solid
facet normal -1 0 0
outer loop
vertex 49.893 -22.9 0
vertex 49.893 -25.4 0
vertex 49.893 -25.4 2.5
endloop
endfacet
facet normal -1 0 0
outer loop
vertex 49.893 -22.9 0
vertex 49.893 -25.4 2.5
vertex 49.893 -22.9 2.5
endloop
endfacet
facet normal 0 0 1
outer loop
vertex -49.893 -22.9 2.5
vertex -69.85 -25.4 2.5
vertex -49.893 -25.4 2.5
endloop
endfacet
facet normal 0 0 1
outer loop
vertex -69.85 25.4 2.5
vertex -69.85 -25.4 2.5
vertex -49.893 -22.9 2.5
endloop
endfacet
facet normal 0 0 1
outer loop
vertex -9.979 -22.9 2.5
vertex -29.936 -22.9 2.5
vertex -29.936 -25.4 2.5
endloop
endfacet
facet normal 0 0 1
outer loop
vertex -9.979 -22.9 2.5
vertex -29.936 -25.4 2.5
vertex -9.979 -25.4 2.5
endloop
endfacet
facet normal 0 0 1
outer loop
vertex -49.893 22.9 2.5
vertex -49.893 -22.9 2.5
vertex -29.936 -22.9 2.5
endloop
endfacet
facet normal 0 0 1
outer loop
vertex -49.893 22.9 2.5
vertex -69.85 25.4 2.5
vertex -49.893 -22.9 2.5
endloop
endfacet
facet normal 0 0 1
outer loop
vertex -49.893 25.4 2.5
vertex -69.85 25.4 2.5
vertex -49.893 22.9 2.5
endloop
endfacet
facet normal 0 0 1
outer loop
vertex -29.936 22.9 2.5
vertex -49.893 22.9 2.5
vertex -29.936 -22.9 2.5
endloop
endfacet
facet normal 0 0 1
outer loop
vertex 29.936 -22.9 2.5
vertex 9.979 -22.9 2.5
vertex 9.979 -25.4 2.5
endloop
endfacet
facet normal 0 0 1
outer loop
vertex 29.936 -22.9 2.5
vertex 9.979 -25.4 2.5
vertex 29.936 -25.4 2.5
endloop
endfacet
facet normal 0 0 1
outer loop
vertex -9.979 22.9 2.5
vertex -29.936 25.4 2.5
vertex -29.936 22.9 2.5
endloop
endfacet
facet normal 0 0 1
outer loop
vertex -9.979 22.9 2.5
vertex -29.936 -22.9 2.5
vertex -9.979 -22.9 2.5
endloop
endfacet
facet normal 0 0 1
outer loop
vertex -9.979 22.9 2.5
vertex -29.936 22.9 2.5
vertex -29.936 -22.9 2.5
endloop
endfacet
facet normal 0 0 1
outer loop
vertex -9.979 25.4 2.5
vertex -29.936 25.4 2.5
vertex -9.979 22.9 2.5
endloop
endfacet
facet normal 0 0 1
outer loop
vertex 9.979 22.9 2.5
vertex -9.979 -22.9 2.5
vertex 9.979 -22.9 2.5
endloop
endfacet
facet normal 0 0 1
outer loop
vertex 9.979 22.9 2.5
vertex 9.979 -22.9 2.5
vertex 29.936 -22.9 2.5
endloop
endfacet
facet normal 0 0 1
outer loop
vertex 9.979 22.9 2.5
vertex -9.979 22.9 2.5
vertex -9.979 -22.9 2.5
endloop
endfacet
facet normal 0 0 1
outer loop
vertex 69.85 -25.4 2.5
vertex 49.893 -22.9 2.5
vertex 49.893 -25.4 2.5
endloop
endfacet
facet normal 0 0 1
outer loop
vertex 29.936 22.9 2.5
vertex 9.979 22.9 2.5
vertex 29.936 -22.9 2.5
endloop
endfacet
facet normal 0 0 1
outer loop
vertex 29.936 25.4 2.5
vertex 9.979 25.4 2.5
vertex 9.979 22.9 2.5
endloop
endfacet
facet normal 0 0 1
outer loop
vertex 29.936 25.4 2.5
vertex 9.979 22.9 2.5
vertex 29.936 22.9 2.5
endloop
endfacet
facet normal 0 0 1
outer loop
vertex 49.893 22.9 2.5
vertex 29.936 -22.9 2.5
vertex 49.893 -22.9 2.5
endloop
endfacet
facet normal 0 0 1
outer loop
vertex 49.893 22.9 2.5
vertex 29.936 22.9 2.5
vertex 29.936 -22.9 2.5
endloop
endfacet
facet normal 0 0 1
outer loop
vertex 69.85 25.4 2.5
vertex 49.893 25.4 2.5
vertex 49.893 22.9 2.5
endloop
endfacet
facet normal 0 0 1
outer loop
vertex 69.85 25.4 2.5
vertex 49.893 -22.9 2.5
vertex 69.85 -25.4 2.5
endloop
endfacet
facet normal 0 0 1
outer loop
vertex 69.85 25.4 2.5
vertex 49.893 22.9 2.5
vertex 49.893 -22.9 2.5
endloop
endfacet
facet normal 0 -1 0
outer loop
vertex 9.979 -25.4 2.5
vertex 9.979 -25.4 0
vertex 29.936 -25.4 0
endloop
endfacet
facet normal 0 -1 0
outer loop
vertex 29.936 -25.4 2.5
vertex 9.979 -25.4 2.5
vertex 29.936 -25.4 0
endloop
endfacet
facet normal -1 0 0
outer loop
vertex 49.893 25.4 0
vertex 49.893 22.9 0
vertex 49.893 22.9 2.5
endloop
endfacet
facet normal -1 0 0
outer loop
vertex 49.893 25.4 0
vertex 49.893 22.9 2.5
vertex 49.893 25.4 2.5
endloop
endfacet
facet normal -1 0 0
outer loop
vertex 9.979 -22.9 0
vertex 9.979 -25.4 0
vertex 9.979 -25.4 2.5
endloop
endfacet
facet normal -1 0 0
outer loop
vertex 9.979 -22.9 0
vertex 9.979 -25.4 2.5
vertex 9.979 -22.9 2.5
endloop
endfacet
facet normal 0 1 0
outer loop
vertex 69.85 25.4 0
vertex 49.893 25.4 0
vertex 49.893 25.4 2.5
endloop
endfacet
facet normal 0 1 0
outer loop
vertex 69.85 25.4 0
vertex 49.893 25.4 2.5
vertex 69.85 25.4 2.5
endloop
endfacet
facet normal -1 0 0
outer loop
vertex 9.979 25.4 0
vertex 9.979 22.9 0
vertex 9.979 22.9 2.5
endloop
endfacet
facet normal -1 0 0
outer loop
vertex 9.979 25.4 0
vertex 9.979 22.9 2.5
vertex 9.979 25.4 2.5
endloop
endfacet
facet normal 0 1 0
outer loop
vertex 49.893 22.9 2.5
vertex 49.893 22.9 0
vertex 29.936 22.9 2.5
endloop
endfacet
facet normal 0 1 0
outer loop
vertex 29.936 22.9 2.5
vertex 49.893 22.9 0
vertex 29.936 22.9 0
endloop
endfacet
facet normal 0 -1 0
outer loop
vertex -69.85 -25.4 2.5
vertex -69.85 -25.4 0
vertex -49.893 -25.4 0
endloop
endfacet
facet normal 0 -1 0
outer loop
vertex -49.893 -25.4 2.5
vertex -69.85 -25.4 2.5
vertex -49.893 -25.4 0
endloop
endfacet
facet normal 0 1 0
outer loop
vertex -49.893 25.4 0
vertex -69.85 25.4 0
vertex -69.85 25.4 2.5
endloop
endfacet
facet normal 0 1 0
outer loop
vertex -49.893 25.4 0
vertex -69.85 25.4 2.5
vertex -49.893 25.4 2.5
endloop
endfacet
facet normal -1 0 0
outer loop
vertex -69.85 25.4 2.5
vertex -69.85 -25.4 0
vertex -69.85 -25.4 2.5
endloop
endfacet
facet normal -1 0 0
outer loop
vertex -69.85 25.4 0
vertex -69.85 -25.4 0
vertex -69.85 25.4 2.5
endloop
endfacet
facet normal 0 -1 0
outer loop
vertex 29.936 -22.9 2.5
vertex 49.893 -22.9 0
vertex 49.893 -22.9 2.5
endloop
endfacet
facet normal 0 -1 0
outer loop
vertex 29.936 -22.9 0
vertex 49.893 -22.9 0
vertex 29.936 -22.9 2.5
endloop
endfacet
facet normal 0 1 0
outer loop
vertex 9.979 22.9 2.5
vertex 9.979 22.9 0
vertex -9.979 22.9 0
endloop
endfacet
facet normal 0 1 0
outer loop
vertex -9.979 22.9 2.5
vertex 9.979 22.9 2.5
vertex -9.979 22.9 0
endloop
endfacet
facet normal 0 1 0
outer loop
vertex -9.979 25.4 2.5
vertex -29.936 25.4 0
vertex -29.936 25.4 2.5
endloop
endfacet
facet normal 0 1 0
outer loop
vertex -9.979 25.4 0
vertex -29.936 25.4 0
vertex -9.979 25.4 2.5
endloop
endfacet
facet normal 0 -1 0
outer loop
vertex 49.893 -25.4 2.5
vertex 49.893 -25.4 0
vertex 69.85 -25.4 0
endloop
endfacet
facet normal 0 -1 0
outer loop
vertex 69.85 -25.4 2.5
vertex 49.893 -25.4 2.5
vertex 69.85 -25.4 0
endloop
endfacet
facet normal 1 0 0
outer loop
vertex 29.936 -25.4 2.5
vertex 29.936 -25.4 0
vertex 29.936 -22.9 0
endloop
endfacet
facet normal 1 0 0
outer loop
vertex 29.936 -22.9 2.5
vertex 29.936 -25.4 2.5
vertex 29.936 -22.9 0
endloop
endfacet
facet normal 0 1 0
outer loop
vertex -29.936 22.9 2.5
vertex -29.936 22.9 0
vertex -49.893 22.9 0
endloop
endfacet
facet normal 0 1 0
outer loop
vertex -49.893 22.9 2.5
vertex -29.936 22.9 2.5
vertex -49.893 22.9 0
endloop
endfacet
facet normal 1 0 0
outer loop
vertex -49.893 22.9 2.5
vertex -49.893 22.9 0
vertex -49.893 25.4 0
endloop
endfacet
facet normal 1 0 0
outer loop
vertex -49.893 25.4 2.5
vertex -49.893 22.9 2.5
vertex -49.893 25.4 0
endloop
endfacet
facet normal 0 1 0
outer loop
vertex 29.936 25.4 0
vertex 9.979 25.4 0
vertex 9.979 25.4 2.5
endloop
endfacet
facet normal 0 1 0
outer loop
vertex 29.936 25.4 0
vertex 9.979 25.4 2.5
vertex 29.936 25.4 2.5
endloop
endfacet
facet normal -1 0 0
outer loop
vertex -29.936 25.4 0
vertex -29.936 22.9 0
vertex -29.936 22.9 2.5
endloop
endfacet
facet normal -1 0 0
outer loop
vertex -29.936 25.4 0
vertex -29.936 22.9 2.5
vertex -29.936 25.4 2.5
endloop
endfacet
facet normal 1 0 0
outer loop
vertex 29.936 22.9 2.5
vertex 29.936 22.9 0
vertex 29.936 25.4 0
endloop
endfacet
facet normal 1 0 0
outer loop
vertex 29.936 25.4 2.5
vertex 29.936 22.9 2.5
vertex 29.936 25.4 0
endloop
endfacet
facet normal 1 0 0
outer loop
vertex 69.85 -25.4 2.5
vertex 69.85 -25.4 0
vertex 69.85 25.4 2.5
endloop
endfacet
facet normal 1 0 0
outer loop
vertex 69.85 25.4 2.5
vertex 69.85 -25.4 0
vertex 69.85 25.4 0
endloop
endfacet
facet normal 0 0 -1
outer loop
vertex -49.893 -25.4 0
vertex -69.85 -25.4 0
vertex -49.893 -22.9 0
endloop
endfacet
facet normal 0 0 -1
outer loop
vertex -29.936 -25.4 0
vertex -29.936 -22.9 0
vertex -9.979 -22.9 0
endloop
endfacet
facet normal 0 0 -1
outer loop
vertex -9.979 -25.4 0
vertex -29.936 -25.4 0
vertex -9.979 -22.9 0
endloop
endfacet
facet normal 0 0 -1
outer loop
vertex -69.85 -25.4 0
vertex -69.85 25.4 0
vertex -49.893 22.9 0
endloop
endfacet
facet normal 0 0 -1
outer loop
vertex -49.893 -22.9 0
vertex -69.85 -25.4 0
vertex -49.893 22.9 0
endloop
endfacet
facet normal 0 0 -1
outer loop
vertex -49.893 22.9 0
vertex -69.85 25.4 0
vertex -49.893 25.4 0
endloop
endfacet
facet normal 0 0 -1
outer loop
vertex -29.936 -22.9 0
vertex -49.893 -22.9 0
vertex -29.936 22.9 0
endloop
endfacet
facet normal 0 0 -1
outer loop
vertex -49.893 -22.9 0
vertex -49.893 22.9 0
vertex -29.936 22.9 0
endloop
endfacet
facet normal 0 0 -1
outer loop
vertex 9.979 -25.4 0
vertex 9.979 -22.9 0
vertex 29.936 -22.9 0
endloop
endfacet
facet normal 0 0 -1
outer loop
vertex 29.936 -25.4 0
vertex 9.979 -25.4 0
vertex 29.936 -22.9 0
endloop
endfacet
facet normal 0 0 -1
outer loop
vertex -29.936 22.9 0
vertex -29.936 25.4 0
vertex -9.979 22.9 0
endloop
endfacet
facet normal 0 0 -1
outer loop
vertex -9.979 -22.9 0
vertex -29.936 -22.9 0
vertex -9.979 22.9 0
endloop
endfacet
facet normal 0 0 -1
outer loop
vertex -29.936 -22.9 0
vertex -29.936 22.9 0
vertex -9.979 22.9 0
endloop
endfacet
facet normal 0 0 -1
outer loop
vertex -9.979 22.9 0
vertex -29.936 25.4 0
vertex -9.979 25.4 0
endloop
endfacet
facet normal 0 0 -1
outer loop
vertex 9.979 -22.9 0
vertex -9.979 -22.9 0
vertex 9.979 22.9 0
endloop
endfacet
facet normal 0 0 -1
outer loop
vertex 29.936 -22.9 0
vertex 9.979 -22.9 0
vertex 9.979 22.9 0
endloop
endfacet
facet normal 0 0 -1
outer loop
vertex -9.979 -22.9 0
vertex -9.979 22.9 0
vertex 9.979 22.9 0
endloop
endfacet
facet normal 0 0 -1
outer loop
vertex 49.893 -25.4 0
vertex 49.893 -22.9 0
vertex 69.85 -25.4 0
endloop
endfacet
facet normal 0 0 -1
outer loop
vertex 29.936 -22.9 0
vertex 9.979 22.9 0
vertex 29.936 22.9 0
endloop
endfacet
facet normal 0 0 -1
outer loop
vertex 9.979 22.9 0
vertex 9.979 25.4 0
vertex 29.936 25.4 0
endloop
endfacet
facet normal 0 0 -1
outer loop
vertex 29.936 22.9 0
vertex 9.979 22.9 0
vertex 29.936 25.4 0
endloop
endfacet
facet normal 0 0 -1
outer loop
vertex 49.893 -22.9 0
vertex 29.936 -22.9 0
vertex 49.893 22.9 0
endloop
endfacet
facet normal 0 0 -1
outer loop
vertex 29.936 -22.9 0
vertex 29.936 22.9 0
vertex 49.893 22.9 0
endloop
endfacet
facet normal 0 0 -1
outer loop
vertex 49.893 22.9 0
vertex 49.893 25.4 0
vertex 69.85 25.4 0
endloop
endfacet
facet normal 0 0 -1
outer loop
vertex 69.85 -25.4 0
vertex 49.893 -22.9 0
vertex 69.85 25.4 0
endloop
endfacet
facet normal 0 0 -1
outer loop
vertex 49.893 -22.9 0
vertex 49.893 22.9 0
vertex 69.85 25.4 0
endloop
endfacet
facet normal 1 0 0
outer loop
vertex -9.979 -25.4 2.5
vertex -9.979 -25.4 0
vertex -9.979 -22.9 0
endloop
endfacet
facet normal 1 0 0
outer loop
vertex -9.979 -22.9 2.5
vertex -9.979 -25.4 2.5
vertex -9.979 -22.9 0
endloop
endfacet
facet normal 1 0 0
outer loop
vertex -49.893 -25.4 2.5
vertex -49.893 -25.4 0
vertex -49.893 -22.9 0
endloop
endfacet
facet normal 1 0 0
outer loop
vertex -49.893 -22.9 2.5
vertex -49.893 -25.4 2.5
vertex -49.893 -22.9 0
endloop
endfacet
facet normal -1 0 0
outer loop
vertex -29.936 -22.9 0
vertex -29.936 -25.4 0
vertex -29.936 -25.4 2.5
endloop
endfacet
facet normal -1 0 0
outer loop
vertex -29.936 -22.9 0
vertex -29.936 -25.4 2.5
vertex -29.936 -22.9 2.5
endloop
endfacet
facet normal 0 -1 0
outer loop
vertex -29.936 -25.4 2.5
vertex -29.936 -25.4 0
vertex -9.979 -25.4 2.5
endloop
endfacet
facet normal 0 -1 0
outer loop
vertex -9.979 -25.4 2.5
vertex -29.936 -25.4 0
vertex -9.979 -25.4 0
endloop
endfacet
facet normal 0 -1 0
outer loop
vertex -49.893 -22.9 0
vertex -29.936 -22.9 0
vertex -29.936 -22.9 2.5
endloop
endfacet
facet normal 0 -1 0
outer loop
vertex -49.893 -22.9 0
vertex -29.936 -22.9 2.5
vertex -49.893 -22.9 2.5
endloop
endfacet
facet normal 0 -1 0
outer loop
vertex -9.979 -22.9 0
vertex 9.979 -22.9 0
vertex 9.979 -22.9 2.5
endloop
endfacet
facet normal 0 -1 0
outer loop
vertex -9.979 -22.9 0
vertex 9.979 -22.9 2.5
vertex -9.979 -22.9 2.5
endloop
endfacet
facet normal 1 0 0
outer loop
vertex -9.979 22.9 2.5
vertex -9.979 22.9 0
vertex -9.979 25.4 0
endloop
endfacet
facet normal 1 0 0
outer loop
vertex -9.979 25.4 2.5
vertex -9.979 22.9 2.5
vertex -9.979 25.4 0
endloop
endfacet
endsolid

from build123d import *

# Parameters (mm, degrees)
SKETCH1_W           = 139.7
SKETCH1_H           = 50.8
BOSS_EXTRUDE1_DEPTH = 2.5
SKETCH3_W           = 19.957142857
SKETCH3_H           = 2.5
SKETCH3_W_2         = 19.957142858
CUT_EXTRUDE2_DEPTH  = 2.54


with BuildPart() as part:
    # Sketch1 → Boss-Extrude1 (new body)
    with BuildSketch(Plane.XY):
        Rectangle(SKETCH1_W, SKETCH1_H)
    extrude(amount=BOSS_EXTRUDE1_DEPTH)

    # Sketch3 → Cut-Extrude2 (cut)
    with BuildSketch(Plane(origin=(0, 0, 0), x_dir=(-1, 0, 0), z_dir=(0, 0, -1))):
        with Locations((-39.914285715, 24.15)):
            Rectangle(SKETCH3_W, SKETCH3_H)
        with Locations((0, 24.15)):
            Rectangle(SKETCH3_W_2, SKETCH3_H)
        with Locations((39.914285715, 24.15)):
            Rectangle(SKETCH3_W, SKETCH3_H)
        with Locations((-39.914285715, -24.15)):
            Rectangle(SKETCH3_W, SKETCH3_H)
        with Locations((0, -24.15)):
            Rectangle(SKETCH3_W_2, SKETCH3_H)
        with Locations((39.914285715, -24.15)):
            Rectangle(SKETCH3_W, SKETCH3_H)
    extrude(amount=-CUT_EXTRUDE2_DEPTH, mode=Mode.SUBTRACT)


solid = part.part
